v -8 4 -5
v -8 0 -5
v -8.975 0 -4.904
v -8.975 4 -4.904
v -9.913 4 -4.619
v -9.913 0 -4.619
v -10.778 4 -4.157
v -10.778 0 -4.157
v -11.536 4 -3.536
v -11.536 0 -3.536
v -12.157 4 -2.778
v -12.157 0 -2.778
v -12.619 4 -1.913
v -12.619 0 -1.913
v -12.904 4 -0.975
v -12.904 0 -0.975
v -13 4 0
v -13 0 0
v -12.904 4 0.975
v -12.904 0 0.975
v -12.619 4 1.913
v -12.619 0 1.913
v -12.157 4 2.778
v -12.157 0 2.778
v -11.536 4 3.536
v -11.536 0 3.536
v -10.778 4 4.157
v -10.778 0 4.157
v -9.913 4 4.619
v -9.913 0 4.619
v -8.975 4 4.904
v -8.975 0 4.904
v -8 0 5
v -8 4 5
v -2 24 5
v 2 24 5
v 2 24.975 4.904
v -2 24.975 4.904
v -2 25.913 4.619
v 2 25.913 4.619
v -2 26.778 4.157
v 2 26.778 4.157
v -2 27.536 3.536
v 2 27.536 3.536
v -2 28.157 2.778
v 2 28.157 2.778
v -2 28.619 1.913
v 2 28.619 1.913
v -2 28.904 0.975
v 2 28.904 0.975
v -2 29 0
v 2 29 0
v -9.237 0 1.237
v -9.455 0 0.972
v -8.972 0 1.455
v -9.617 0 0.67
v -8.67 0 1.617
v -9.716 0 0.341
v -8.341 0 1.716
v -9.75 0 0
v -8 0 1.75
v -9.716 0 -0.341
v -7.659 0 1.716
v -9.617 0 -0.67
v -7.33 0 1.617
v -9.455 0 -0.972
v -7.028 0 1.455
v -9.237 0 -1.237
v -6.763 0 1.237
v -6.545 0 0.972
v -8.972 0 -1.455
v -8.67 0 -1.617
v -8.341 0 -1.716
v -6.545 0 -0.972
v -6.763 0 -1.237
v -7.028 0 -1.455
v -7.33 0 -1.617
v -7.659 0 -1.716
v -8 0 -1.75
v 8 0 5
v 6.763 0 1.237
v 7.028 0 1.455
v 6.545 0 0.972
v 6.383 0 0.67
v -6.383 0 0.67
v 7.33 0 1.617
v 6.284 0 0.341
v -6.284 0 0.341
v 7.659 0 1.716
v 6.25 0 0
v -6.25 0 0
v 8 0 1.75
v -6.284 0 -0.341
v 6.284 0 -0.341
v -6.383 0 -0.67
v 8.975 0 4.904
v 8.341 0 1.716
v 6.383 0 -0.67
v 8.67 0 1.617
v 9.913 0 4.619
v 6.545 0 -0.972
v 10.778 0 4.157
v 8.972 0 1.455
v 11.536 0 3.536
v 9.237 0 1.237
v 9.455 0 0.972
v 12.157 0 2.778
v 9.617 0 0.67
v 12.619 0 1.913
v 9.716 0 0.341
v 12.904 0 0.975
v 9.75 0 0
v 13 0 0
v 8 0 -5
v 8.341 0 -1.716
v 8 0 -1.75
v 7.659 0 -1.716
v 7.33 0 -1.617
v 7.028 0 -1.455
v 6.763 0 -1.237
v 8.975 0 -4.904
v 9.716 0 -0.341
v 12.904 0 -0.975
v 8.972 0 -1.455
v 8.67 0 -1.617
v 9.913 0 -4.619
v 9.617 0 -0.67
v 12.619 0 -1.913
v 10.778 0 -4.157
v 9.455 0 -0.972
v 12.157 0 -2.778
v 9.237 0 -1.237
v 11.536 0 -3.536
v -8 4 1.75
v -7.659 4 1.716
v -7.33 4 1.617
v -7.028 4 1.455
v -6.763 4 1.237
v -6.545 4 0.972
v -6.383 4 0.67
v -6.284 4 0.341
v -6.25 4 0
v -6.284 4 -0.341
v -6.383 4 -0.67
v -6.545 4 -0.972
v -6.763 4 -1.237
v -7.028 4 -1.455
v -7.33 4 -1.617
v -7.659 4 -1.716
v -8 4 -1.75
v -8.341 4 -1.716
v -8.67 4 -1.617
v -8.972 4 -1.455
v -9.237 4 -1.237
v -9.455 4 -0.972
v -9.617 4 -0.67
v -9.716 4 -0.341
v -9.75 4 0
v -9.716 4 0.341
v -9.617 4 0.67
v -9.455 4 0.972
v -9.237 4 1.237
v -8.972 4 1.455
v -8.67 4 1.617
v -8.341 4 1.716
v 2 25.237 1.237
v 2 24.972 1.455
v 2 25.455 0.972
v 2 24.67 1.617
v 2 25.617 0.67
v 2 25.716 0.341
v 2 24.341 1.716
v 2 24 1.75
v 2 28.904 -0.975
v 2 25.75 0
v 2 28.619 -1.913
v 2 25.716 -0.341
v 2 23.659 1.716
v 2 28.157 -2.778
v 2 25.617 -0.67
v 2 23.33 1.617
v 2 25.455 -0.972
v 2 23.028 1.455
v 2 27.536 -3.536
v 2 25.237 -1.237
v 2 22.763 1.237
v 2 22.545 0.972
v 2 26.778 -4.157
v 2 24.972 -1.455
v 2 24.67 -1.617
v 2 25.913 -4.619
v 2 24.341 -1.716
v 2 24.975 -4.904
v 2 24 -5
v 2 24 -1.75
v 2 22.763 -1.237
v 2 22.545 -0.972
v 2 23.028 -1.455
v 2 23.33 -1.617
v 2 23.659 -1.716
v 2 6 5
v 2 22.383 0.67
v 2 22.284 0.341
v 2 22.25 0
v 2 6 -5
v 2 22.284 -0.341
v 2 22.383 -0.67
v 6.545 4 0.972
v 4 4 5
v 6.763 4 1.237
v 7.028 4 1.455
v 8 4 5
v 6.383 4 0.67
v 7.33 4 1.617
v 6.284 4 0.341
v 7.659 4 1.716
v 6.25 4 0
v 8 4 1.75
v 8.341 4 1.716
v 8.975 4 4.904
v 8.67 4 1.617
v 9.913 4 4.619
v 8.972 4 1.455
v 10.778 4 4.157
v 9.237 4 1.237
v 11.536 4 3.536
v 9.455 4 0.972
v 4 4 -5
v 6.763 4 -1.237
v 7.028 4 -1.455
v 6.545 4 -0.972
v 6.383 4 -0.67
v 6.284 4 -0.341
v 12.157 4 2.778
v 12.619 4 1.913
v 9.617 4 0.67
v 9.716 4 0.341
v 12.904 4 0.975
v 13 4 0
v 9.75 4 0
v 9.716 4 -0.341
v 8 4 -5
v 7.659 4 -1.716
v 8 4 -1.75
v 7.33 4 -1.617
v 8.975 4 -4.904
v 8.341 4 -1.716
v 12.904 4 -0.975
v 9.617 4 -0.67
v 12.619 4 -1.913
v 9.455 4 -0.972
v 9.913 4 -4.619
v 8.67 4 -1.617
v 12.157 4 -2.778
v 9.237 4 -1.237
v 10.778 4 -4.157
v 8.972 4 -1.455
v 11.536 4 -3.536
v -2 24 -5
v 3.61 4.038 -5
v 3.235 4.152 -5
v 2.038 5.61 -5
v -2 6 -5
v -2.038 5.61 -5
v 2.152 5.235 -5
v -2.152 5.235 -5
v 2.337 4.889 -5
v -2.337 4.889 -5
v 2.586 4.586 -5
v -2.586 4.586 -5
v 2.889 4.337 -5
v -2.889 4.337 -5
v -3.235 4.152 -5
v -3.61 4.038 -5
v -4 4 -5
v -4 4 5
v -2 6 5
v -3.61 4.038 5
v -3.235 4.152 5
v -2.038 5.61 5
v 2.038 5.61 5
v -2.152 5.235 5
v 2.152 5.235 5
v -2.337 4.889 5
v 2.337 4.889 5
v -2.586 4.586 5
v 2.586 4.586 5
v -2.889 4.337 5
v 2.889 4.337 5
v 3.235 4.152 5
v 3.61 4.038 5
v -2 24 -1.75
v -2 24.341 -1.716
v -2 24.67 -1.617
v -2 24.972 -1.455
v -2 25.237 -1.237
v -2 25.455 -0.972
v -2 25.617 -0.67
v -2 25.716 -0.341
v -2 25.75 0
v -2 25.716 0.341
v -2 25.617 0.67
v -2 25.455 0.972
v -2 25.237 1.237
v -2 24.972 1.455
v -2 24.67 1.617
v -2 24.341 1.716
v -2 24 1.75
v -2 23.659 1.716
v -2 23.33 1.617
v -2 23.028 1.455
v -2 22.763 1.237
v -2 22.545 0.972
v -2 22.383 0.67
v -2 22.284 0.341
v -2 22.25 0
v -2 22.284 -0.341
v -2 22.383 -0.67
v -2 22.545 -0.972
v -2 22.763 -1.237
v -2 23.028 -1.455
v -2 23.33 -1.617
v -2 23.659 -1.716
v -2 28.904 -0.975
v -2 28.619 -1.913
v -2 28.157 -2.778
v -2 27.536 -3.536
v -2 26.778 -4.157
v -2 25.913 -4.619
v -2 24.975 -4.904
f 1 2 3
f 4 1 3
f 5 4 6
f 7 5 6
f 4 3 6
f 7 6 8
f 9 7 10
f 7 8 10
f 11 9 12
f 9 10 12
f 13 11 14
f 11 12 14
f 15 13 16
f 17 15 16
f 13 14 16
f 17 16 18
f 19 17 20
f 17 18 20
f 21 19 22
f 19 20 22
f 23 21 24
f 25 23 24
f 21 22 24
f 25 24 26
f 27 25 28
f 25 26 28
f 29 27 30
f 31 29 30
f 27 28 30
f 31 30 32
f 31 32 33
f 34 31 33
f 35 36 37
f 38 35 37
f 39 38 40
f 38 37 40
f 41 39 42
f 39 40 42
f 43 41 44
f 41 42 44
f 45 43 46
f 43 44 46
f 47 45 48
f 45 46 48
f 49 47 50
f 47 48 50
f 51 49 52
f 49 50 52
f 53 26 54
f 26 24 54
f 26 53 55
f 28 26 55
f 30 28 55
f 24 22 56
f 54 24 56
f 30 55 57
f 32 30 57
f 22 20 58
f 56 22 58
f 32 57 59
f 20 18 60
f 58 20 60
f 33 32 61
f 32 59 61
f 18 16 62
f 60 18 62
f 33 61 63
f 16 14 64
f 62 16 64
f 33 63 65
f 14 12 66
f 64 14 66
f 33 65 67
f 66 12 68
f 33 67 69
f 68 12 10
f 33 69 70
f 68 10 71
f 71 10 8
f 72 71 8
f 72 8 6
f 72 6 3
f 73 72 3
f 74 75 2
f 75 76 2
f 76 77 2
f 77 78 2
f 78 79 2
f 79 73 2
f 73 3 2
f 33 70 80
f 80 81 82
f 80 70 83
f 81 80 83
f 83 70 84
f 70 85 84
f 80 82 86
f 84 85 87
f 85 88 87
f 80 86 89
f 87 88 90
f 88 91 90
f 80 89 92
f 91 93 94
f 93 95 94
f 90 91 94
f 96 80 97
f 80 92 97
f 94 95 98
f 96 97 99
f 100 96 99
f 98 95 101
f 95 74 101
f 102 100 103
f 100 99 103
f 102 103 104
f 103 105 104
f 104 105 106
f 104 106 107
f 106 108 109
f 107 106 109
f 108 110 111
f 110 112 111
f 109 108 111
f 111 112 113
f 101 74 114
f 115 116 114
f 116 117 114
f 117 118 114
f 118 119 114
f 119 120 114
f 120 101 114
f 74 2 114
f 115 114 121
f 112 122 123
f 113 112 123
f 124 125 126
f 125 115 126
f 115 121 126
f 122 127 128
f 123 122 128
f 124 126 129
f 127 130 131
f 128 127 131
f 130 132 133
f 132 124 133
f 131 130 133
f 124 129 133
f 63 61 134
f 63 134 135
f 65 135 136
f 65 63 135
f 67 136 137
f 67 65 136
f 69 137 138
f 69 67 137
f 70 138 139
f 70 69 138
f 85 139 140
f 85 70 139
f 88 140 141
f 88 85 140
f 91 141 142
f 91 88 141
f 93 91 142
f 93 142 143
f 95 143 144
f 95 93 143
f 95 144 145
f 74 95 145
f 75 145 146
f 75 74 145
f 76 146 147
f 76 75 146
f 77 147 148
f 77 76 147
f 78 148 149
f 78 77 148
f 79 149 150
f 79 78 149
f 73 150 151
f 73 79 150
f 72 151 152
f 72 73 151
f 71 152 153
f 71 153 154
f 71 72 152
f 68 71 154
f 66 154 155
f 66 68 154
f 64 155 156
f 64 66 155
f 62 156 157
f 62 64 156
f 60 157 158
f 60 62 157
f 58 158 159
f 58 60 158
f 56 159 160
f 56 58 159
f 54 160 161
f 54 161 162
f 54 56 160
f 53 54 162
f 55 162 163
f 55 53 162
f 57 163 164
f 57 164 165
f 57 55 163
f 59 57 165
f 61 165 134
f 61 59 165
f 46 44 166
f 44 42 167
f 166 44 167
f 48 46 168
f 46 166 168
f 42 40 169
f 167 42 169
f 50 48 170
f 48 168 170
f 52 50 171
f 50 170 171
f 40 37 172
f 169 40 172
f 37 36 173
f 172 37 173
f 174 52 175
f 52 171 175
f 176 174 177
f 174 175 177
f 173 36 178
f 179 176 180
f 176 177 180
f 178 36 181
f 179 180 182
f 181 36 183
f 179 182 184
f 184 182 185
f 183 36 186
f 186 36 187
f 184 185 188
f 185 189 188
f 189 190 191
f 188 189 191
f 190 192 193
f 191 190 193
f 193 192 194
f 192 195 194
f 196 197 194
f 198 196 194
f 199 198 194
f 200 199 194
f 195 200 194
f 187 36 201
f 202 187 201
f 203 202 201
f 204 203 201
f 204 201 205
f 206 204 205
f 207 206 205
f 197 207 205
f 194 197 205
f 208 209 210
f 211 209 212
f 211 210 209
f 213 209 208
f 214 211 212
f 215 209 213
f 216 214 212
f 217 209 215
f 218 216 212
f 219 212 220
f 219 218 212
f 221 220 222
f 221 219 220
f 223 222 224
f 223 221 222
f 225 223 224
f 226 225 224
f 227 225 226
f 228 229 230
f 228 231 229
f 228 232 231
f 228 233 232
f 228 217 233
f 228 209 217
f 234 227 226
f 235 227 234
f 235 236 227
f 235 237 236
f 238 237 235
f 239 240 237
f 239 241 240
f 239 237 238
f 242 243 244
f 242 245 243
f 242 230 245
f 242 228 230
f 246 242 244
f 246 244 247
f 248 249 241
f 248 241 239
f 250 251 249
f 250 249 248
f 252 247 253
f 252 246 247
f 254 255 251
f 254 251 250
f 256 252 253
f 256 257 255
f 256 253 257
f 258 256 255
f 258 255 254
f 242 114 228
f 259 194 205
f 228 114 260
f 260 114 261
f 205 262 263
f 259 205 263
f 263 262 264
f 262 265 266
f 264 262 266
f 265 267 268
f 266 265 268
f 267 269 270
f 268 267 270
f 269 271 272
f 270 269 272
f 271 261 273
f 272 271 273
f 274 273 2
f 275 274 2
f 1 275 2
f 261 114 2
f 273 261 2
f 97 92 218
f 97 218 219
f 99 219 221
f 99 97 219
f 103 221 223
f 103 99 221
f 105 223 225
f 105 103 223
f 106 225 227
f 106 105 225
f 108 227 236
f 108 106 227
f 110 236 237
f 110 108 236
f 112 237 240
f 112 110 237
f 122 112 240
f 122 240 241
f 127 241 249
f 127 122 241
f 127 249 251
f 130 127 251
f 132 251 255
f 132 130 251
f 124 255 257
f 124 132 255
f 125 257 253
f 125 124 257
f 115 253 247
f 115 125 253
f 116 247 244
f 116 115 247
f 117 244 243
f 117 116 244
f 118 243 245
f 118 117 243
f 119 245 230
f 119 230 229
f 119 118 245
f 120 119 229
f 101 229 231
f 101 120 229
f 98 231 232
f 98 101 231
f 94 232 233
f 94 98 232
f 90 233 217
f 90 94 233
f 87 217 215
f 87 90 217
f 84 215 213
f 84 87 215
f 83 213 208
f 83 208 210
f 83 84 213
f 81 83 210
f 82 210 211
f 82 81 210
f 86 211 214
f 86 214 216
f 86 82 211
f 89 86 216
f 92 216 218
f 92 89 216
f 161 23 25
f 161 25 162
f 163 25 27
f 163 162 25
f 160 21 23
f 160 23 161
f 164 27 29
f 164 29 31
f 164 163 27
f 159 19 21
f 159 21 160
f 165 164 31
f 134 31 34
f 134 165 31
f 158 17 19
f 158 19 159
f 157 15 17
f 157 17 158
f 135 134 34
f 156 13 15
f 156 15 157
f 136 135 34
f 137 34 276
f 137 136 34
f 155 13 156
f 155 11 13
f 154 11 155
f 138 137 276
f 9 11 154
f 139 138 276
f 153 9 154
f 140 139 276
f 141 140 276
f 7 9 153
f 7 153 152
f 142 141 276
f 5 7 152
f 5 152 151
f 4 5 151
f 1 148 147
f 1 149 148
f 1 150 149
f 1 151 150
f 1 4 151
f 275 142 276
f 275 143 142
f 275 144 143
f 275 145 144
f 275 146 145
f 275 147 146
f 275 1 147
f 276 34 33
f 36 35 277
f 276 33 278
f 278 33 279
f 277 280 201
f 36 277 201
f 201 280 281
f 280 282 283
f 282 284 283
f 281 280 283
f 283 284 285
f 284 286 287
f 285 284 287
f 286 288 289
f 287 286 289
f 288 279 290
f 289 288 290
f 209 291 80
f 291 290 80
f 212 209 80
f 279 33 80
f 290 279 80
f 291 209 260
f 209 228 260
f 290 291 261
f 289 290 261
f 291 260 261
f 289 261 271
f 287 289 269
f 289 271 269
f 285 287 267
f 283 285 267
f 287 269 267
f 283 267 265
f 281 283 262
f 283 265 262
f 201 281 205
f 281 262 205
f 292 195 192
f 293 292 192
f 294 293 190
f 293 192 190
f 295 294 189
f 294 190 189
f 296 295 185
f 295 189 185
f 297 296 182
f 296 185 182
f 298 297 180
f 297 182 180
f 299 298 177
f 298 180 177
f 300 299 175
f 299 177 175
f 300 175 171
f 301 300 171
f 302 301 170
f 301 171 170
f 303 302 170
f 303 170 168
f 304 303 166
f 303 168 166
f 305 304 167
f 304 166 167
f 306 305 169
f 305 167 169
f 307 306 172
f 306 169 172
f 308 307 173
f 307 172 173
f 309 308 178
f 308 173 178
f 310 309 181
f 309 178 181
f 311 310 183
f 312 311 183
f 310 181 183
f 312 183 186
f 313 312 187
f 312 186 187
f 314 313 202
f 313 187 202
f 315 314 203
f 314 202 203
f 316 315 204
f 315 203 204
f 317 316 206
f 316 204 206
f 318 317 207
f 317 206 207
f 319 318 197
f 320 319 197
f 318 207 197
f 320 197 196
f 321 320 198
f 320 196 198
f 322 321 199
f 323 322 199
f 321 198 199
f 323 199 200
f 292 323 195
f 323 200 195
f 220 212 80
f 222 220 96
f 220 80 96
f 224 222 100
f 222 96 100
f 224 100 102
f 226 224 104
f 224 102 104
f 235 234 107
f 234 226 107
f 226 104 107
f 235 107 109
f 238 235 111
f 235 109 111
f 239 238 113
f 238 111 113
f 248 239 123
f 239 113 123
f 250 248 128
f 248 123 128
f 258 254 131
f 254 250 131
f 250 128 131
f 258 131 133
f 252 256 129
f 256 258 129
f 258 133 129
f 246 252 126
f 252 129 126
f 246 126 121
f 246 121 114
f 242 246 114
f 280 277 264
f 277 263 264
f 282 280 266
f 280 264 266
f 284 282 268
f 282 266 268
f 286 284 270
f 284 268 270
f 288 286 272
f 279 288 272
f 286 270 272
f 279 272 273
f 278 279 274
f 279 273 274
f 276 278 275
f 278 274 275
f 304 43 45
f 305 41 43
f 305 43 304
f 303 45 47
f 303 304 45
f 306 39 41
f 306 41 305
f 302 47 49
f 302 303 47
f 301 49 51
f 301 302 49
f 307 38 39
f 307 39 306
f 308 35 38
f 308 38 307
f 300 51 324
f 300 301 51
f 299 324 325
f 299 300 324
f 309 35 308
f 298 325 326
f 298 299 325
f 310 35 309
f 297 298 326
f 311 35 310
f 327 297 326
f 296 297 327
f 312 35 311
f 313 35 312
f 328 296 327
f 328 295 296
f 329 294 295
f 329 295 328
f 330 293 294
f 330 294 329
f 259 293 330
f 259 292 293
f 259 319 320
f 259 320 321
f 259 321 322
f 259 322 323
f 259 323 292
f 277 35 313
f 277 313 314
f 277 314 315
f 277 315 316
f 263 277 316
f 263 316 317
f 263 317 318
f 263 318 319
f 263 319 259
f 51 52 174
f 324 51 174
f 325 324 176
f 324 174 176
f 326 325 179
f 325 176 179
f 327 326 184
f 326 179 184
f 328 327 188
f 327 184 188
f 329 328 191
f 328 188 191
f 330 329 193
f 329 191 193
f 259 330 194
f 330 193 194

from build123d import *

# Parameters (mm, degrees)
SKETCH1_R           = 5
SKETCH1_R_2         = 1.75
BOSS_EXTRUDE1_DEPTH = 4
SKETCH2_W           = 4
SKETCH2_H           = 10
BOSS_EXTRUDE2_DEPTH = 25
SKETCH3_R           = 1.75
CUT_EXTRUDE1_DEPTH  = 4
FILLET1_R           = 2
FILLET2_R           = 2


with BuildPart() as part:
    # Sketch1 → Boss-Extrude1 (new body)
    # profile 1 of 3: a face of its own
    with BuildSketch(Plane(origin=(0, 0, 0), x_dir=(1, 0, 0), z_dir=(0, 1, 0))):
        with Locations((-8, 0)):
            Circle(SKETCH1_R)
        with Locations(Location((-8, 0, 0), (0, 0, 270))):
            Circle(SKETCH1_R_2, mode=Mode.SUBTRACT)
    # profile 2 of 3: a face of its own
    with BuildSketch(Plane(origin=(0, 0, 0), x_dir=(1, 0, 0), z_dir=(0, 1, 0))):
        with BuildLine():
            Line((8, 5), (-8, 5))
            ThreePointArc((-8, 5), (-4.464466094, 3.535533906), (-3, 0))
            ThreePointArc((-3, 0), (-4.464466094, -3.535533906), (-8, -5))
            Line((-8, -5), (8, -5))
            ThreePointArc((8, -5), (3, 0), (8, 5))
        make_face()
    # profile 3 of 3: a face of its own
    with BuildSketch(Plane(origin=(0, 0, 0), x_dir=(1, 0, 0), z_dir=(0, 1, 0))):
        with Locations((8, 0)):
            Circle(SKETCH1_R)
        with Locations(Location((8, 0, 0), (0, 0, 270))):
            Circle(SKETCH1_R_2, mode=Mode.SUBTRACT)
    extrude(amount=BOSS_EXTRUDE1_DEPTH)

    # Sketch2 → Boss-Extrude2 (add)
    with BuildSketch(Plane(origin=(0, 4, 0), x_dir=(1, 0, 0), z_dir=(0, 1, 0))):
        Rectangle(SKETCH2_W, SKETCH2_H)
    extrude(amount=BOSS_EXTRUDE2_DEPTH)

    # Sketch3 → Cut-Extrude1 (cut)
    with BuildSketch(Plane(origin=(2, 0, 0), x_dir=(0, 0, -1), z_dir=(1, 0, 0))):
        with BuildLine():
            Line((-5, 29), (-5, 24))
            ThreePointArc((-5, 24), (-3.535533915, 27.535533897), (-2.5e-08, 29))
            Line((-2.5e-08, 29), (-5, 29))
        make_face()
        with BuildLine():
            ThreePointArc((-2.5e-08, 29), (3.535533897, 27.535533915), (5, 24))
            Line((5, 24), (5, 29))
            Line((5, 29), (-2.5e-08, 29))
        make_face()
        with Locations((0, 24)):
            Circle(SKETCH3_R)
    extrude(amount=-CUT_EXTRUDE1_DEPTH, mode=Mode.SUBTRACT)

    # Fillet1
    fillet1_edges = [part.edges().sort_by_distance(p)[0] for p in [
        (2, 4, 0),
    ]]
    fillet(fillet1_edges, radius=FILLET1_R)

    # Fillet2
    fillet2_edges = [part.edges().sort_by_distance(p)[0] for p in [
        (-2, 4, 0),
    ]]
    fillet(fillet2_edges, radius=FILLET2_R)


solid = part.part
